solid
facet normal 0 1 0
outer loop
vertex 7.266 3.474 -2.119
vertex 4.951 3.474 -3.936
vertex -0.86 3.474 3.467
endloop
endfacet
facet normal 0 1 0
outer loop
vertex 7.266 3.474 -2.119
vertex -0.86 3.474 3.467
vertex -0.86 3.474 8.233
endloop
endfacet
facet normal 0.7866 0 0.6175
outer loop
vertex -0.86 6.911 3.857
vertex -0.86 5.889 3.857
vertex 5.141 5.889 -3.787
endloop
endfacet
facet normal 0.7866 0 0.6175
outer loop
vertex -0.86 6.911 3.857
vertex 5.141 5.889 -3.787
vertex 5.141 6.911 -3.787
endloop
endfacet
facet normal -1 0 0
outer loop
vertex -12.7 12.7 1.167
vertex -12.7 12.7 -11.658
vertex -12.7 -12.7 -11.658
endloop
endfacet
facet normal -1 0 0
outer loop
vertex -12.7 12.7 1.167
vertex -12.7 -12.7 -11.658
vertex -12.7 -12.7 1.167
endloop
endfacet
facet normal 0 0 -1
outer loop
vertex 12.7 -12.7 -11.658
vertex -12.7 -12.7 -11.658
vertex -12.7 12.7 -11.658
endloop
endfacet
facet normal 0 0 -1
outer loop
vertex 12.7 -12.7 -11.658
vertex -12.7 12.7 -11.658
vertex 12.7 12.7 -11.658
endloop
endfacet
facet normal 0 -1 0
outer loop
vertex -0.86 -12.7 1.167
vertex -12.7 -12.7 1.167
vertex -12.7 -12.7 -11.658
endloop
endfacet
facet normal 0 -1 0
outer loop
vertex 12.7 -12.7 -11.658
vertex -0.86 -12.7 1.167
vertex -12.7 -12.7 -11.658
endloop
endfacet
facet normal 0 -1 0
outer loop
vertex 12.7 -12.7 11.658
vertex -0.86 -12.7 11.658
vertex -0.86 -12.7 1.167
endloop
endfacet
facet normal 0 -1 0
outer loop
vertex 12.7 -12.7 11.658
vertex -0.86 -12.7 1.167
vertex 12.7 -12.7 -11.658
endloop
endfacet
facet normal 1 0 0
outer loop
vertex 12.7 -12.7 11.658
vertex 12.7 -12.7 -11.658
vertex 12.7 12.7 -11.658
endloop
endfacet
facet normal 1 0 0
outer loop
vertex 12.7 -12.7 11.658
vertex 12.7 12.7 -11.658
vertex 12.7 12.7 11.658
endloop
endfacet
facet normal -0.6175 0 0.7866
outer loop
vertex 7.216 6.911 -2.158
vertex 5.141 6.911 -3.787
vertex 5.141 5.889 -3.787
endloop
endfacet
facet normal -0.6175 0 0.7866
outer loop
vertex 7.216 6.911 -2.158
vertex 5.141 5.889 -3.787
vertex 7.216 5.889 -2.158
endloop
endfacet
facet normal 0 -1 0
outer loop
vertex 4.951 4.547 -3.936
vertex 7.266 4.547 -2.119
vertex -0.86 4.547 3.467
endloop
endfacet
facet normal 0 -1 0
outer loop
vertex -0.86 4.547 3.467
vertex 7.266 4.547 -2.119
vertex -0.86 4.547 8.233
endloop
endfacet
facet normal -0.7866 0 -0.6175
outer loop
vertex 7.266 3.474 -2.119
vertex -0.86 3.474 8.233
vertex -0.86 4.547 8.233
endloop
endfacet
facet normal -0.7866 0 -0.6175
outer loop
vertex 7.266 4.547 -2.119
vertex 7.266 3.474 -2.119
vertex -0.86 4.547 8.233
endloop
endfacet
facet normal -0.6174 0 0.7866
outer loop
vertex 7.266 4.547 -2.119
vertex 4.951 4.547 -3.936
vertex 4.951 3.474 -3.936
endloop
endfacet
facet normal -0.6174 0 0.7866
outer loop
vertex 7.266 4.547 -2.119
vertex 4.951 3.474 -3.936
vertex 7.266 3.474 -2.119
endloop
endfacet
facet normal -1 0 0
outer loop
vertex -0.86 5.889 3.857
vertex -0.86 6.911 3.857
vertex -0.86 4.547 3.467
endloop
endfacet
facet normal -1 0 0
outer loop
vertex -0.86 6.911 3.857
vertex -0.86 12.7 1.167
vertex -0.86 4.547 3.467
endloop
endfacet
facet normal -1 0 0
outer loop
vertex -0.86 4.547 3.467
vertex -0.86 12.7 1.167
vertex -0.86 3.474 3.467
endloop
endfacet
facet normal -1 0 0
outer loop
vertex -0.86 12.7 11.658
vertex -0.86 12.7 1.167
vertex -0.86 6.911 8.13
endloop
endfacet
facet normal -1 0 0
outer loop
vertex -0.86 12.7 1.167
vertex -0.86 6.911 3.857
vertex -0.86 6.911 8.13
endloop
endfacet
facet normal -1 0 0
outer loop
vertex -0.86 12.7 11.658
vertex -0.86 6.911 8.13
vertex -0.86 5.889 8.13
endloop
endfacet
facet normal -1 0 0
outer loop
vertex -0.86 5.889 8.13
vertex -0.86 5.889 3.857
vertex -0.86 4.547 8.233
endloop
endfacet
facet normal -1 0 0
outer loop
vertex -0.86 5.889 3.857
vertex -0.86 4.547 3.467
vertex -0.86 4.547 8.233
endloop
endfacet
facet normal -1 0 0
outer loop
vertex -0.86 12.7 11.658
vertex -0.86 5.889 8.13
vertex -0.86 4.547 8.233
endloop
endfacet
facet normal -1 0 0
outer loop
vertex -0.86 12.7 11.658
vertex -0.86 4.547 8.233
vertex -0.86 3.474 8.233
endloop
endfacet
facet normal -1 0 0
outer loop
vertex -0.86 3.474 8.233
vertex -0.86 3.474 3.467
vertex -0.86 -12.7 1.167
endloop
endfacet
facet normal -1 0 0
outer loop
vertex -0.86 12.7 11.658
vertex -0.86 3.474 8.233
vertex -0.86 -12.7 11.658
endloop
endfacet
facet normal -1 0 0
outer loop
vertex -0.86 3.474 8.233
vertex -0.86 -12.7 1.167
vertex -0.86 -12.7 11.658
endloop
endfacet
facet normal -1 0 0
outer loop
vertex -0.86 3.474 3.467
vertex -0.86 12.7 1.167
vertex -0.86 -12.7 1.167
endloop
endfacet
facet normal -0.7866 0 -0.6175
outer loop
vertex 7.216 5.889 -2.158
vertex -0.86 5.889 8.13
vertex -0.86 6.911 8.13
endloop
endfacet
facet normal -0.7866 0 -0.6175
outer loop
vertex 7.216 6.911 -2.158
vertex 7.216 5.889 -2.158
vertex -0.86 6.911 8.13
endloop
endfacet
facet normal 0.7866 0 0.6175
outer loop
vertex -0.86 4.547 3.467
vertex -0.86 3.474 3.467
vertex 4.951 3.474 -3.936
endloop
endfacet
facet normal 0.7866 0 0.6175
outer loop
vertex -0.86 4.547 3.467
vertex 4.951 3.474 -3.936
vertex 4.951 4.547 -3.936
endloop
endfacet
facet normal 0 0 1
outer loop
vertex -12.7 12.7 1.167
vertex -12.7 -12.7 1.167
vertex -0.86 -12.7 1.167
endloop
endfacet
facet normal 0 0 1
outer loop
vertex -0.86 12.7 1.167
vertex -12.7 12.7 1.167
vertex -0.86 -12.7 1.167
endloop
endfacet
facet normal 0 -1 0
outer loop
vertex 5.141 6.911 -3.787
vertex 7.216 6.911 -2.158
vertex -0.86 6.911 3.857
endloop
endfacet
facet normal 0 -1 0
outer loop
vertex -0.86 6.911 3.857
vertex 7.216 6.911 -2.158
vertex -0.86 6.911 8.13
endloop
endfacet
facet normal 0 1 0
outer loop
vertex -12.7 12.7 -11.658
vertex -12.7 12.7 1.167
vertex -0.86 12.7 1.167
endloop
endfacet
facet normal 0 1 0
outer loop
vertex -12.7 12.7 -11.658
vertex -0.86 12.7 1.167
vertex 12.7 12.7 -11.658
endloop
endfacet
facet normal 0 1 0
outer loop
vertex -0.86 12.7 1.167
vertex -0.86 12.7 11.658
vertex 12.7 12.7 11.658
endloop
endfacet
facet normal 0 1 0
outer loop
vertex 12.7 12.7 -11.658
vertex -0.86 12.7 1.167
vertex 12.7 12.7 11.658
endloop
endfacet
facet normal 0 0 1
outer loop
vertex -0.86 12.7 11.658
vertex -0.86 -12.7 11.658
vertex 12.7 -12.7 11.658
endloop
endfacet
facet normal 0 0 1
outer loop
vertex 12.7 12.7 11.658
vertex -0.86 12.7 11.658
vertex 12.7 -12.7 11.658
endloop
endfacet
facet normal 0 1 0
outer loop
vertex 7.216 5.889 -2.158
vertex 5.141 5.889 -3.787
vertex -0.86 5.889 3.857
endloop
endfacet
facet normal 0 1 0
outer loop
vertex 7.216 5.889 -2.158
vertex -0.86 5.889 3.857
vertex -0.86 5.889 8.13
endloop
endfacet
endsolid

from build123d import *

# Parameters (mm, degrees)
F0_W     = 25.4
F0_H     = 23.3165774701
F1_DEPTH = 12.7
F3_DEPTH = 25.4
F4_W     = 0.2736736362
F4_H     = 1.0221730918
F4_W_2   = 2.3645318859
F4_W_3   = 0.3372822987
F4_H_2   = 1.0734191164
F4_W_4   = 2.6054769249
F5_DEPTH = 17.78
F7_DEPTH = 25.4


with BuildPart() as f1:
    # F0 (on Front) → F1 (new body, symmetric)
    with BuildSketch(Plane.XZ):
        Rectangle(F0_W, F0_H)
    extrude(amount=F1_DEPTH, both=True)

    # F2 (on face) → F3 (cut)
    with BuildSketch(Plane.XZ.offset(12.7)):
        Polygon((-12.7, 4.811515566), (-3.9780791849, 11.6582887351), (-12.7, 11.6582887351), align=None)
    extrude(amount=-F3_DEPTH, mode=Mode.SUBTRACT)

    # F4 (on face) → F5 (cut)
    with BuildSketch(Plane(origin=(-7.1791973158, 0, 9.1453870251), x_dir=(0.7865883501, 0, 0.6174777466), z_dir=(-0.6174777466, 0, 0.7865883501))):
        with Locations((4.2064599323, 6.4000822604)):
            Rectangle(F4_W, F4_H)
        with Locations((2.8873571713, 6.4000822604)):
            Rectangle(F4_W_2, F4_H)
        with Locations((4.2382642636, 4.0104491636)):
            Rectangle(F4_W_3, F4_H_2)
        with Locations((2.7668846518, 4.0104491636)):
            Rectangle(F4_W_4, F4_H_2)
    extrude(amount=-F5_DEPTH, mode=Mode.SUBTRACT)

    # F6 (on face) → F7 (cut)
    with BuildSketch(Plane.XZ.offset(12.7)):
        Polygon((-21.5201042593, 1.1665492784), (-12.7, 1.1665492784), (-12.7, 4.811515566), (-3.9780791849, 11.6582887351), (-0.8602180751, 11.6582887351), (-0.8602180751, 16.2579510361), (-21.5201042593, 16.2579510361), align=None)
        Polygon((-12.7, 1.1665492784), (-0.8602180751, 1.1665492784), (-0.8602180751, 11.6582887351), (-3.9780791849, 11.6582887351), (-12.7, 4.811515566), align=None)
    extrude(amount=-F7_DEPTH, mode=Mode.SUBTRACT)


solid = f1.part
